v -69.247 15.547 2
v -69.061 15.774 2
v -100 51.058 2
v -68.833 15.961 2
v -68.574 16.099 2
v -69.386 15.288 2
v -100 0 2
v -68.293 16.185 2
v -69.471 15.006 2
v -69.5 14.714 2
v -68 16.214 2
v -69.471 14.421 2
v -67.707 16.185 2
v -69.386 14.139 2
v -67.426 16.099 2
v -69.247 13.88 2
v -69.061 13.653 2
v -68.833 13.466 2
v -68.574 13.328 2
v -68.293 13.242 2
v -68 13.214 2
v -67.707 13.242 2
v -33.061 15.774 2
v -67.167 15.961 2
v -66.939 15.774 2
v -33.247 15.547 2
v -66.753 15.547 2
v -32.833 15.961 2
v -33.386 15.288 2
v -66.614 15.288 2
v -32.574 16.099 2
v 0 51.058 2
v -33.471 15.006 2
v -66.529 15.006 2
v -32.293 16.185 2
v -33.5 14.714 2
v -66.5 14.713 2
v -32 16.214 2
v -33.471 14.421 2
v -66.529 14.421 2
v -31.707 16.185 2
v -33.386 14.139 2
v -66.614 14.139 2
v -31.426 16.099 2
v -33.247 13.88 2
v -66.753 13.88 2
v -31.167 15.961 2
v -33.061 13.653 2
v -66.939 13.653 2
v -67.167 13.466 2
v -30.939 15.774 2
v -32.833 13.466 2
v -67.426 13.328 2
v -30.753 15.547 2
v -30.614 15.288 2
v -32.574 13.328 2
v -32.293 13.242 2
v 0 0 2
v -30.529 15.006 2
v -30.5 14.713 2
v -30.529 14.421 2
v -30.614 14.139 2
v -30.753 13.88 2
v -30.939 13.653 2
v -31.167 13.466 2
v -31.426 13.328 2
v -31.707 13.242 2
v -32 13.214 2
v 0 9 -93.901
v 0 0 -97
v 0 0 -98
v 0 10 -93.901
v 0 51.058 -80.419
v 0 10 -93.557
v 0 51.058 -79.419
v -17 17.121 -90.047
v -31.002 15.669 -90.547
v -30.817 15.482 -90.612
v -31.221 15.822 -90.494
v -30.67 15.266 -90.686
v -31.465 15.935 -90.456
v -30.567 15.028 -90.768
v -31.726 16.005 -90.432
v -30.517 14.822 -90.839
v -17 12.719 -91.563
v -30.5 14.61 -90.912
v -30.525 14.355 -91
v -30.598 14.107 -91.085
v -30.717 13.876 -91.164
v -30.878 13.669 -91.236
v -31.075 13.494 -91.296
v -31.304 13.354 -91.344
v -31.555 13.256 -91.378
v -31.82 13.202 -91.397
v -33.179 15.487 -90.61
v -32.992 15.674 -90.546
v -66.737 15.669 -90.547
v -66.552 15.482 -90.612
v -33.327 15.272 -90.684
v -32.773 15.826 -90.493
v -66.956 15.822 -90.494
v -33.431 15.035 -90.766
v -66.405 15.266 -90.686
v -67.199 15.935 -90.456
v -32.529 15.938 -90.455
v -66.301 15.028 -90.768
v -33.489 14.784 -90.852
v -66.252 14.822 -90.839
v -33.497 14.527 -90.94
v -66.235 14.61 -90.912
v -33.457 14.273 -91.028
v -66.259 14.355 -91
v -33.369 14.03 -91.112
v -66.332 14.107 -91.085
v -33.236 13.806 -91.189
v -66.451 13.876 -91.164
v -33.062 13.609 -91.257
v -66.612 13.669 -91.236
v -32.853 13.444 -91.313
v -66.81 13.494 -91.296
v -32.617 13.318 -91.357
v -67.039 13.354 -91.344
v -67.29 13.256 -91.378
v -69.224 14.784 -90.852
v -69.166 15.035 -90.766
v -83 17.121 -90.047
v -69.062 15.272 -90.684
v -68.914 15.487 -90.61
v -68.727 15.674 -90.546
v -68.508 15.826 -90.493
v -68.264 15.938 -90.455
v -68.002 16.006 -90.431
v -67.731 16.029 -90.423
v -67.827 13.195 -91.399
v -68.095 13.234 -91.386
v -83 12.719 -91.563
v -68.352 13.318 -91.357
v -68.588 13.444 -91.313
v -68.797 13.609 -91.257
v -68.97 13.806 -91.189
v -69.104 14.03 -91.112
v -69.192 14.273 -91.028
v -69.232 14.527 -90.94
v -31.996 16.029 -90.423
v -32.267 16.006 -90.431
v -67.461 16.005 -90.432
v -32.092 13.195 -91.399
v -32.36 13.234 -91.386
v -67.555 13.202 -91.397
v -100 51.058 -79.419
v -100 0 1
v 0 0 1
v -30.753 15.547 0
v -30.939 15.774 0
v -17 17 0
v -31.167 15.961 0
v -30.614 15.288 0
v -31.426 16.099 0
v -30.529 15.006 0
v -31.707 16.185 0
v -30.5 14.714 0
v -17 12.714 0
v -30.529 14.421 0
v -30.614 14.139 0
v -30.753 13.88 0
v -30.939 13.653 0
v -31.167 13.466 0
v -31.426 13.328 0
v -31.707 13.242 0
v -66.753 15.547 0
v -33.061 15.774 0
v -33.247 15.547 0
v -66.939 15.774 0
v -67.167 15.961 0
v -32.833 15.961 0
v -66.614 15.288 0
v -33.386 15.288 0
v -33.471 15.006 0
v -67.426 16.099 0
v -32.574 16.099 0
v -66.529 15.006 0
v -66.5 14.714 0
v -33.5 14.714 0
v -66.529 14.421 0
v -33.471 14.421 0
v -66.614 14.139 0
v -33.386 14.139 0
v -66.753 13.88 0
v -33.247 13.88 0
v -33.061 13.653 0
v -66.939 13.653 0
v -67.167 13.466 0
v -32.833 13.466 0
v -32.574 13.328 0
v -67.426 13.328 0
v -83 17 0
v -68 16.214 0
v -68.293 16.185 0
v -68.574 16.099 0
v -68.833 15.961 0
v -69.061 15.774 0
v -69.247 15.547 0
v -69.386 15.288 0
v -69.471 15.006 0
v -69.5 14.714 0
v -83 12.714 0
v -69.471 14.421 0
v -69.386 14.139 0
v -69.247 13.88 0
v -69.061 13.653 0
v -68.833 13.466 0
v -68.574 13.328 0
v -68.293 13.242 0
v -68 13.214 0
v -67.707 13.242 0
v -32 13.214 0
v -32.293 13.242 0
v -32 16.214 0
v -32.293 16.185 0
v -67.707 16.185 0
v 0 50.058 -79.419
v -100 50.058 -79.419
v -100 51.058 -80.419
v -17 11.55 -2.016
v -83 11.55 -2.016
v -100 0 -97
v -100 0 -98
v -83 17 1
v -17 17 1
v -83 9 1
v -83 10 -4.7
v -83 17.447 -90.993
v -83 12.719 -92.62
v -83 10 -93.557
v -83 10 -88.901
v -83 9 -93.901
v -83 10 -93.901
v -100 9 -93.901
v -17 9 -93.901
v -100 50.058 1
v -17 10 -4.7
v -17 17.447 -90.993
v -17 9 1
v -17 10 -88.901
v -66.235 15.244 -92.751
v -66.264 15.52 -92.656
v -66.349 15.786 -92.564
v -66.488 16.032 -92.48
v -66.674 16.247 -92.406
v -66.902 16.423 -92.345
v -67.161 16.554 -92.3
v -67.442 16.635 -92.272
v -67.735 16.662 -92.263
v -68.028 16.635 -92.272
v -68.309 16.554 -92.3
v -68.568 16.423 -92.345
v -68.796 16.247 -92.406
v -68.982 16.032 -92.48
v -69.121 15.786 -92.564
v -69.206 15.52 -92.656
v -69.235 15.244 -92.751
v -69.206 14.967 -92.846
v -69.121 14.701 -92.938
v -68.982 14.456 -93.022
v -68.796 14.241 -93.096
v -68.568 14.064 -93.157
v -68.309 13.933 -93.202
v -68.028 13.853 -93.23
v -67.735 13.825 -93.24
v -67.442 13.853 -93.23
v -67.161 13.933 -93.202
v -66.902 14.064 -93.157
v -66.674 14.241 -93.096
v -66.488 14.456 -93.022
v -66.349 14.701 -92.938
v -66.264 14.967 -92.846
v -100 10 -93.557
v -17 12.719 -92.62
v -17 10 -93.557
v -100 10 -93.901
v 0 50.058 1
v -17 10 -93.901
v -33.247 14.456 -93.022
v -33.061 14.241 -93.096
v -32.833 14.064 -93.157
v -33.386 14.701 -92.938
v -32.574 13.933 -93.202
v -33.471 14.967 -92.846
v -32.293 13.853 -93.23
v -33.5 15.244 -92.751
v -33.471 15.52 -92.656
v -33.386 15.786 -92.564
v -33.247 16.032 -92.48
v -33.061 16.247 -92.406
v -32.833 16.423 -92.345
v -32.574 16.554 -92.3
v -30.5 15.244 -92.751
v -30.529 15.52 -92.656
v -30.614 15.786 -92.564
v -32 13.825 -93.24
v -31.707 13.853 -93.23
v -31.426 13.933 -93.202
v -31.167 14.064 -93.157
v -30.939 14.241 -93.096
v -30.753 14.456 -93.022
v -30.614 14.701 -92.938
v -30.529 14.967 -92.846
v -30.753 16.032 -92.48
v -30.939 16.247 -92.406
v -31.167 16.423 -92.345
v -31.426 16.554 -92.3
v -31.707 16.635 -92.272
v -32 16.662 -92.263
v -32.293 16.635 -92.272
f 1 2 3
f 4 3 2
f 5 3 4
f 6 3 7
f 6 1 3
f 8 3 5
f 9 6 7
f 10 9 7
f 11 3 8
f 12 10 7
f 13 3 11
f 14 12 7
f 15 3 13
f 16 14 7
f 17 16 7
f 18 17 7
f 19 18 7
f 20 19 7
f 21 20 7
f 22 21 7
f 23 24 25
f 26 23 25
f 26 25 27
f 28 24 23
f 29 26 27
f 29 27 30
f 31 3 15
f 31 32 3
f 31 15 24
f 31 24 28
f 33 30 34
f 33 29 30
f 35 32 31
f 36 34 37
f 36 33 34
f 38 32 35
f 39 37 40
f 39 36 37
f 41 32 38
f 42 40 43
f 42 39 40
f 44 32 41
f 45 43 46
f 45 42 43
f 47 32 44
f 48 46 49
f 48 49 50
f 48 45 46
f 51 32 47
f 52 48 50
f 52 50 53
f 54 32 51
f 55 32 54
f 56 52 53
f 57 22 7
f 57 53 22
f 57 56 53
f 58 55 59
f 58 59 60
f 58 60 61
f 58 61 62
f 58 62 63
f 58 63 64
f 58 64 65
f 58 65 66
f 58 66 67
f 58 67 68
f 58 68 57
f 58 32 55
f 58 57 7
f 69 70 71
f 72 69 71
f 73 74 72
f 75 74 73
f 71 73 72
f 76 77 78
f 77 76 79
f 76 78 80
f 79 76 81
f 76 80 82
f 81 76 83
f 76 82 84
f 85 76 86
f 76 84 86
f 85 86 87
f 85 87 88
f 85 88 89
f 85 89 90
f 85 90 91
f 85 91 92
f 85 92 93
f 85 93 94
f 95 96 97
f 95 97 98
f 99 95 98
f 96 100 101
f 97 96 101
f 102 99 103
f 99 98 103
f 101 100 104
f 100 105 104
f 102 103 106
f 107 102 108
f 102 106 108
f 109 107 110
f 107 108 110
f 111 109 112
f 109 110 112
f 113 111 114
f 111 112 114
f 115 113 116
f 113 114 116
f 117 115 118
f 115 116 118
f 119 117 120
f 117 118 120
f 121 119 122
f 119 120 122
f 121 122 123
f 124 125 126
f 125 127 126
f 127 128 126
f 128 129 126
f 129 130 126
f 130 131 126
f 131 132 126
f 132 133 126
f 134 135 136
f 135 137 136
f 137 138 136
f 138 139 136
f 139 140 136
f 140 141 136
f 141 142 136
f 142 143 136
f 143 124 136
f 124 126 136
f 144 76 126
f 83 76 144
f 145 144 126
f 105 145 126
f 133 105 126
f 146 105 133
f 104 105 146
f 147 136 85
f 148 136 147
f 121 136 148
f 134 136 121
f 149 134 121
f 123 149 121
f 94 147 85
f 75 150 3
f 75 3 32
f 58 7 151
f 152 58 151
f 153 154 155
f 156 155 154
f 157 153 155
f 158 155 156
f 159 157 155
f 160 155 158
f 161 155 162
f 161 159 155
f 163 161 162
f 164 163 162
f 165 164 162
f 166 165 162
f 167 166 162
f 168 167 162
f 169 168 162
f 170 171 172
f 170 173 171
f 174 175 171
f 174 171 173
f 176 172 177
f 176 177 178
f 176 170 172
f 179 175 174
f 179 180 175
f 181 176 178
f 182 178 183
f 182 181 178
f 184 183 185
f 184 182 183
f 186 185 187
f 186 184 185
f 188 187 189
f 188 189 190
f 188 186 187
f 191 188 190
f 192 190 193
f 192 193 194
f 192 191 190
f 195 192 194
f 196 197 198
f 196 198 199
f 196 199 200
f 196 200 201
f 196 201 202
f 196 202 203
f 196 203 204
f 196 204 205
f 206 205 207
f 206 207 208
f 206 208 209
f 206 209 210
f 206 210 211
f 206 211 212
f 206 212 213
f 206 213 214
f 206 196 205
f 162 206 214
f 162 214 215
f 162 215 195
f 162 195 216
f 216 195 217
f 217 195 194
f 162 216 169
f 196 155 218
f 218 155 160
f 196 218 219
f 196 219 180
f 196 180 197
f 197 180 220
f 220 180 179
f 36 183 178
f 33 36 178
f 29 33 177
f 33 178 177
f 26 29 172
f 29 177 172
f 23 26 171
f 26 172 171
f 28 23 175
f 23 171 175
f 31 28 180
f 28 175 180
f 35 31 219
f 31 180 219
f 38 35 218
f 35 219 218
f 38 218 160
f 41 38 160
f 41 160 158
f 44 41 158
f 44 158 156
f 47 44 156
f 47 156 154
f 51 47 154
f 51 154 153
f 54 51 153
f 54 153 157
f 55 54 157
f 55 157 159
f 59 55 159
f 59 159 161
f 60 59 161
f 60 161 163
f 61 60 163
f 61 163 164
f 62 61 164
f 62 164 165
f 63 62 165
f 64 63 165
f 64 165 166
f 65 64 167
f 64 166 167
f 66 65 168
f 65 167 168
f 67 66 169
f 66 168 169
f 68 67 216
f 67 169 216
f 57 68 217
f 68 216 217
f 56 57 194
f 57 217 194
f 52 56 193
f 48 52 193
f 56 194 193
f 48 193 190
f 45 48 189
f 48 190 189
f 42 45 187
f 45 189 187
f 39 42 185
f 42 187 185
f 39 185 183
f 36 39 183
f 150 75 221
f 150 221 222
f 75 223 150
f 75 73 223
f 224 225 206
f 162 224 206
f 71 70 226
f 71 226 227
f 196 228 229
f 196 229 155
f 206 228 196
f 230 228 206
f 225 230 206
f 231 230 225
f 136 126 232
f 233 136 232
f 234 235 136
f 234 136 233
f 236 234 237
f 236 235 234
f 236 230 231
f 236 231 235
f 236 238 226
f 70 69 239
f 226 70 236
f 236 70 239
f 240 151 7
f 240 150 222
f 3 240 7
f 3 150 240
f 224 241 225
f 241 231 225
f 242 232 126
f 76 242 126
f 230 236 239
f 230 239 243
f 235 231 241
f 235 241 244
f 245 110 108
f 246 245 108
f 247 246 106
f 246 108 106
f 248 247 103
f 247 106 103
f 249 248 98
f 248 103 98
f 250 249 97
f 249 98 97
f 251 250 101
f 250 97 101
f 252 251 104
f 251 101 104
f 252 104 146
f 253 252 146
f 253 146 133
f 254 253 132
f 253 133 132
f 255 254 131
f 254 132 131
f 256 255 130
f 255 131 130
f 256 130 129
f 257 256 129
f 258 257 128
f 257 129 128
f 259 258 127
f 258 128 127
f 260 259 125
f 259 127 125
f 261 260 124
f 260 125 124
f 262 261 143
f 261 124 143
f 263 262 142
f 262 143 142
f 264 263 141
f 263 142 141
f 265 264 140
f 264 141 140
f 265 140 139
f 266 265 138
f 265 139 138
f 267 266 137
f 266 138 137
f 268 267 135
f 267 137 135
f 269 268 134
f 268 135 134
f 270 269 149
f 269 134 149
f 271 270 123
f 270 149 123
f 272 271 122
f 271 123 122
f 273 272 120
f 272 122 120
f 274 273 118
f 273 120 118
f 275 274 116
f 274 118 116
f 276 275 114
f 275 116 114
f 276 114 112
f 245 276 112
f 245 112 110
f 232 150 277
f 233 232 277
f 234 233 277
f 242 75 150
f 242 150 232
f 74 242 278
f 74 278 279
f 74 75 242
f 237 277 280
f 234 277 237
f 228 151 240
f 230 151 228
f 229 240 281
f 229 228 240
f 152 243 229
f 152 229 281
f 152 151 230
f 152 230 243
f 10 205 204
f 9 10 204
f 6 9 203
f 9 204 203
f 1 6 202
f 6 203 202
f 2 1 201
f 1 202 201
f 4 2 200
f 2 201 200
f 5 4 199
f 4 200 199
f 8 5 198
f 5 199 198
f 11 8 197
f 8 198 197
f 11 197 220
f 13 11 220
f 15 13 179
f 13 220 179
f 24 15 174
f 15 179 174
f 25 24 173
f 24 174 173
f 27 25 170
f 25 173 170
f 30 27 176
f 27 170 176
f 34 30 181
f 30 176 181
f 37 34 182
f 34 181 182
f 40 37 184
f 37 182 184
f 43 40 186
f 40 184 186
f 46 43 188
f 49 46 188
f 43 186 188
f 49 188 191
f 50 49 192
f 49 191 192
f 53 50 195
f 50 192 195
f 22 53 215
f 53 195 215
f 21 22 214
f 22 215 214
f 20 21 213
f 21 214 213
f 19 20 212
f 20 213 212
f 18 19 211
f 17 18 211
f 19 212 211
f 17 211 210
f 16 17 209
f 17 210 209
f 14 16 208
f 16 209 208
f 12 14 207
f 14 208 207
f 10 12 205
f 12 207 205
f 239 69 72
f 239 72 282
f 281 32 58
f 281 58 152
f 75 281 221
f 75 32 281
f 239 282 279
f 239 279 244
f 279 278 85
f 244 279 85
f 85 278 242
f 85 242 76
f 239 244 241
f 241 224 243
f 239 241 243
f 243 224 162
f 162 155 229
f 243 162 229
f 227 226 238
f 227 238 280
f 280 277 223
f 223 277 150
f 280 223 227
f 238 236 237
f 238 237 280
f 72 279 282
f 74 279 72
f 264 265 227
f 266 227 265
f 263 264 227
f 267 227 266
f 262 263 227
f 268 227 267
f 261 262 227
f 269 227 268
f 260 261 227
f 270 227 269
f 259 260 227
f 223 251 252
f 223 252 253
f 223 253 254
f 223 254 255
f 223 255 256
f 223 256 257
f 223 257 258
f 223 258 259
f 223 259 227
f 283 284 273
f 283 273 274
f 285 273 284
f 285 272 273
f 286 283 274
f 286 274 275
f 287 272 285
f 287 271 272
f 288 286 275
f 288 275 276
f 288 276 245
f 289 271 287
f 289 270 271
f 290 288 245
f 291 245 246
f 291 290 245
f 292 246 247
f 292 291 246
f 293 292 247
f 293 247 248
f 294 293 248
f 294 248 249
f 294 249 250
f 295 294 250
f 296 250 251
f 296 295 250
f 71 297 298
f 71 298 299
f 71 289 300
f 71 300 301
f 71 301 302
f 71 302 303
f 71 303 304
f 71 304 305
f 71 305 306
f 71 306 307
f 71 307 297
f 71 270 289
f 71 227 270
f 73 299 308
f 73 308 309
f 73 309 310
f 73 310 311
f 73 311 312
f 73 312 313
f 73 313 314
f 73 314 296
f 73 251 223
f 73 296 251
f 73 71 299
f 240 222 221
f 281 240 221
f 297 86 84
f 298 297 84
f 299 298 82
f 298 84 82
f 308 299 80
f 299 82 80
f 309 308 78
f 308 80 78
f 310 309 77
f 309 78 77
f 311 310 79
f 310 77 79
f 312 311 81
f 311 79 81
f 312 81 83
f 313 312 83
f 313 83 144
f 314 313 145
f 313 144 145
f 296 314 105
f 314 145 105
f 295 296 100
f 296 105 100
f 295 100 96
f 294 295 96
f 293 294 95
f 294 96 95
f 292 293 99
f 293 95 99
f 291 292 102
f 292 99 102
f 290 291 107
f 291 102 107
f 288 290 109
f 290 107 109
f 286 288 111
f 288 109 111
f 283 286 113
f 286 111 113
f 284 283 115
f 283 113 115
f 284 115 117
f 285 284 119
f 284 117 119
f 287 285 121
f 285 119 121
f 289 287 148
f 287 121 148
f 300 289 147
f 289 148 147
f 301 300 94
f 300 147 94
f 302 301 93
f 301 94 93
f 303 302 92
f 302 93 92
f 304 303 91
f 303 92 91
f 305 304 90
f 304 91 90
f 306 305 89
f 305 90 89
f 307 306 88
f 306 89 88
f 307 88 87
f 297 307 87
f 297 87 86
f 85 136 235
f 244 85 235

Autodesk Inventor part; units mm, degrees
ref_plane "YZ Plane" through (0, 0, 0) normal (1, 0, 0) x (0, 1, 0)
ref_plane "XZ Plane" through (0, 0, 0) normal (0, 1, 0) x (-1, 0, 0)
ref_plane "XY Plane" through (0, 0, 0) normal (0, 0, 1) x (1, 0, 0)
sketch "Szkic1" plane through (0, 0, 0) normal (1, 0, 0) x (0, 1, 0)
  line L0 (0, 0) -> (0, -88)
  line L1 (51.058, -70.4193) -> (51.058, -71.4193)
  line L2 (0, -88) -> (0, -97)
  line L3 (0, -97) -> (0, -98)
  line L4 (0, -98) -> (51.058, -80.4193)
  line L5 (51.058, -80.4193) -> (51.058, -79.4193)
  line L6 (51.058, -79.4193) -> (0, -97)
  line L7 (0, 0) -> (0, 1)
  line L8 (0, 1) -> (51.058, 1)
  line L9 (51.058, 1) -> (51.058, 2)
  line L10 (51.058, 2) -> (0, 2)
  line L11 (0, 2) -> (0, 1)
  dimension "d0" = 88
  dimension "d1" = 54
  dimension "d5" = 9
  dimension "d6" = 1
  dimension "d7" = 54
  dimension "d8" = 71
  dimension "d9" = 1
  dimension "d10" = 1
  dimension "d11" = 1
extrude "Wyciągnięcie proste1" add sketch "Szkic1" against normal blind 100
sketch "Szkic2" plane through (-100, 0, 0) normal (-1, 0, 0) x (0, 0, 1)
  line L0 (0, 10) -> (1, 10)
  line L1 (1, 51.058) -> (1, 0) projected
  line L2 (0, 10) -> (-93.5567, 10)
  line L3 (-79.4193, 51.058) -> (-97, 0) projected
  line L4 (0, 9) -> (1, 9)
  line L5 (0, 9) -> (-93.9011, 9)
  line L6 (-93.5567, 10) -> (-93.9011, 9)
  line L7 (1, 10) -> (1, 9)
  point P0 (0, 0)
  dimension "d14" = 10
  dimension "d15" = 1
extrude "Wyciągnięcie proste2" add sketch "Szkic2" against normal blind 100
sketch "Szkic3" plane through (-100, 51.058, -79.4193) normal (0, -0.3256, 0.9455) x (1, 0, 0)
  point P0 (100, -22.4199)
sketch "Szkic4" plane through (-100, 51.058, -80.4193) normal (0, 1, 0) x (1, 0, 0)
  line L0 (100, -81.4193) -> (100, 13.4817) projected
  line L1 (100, 0) -> (100, -1) projected
  line L2 (100, -81.4193) -> (100, -1)
  line L3 (0, -1) -> (0, 0) projected
  line L4 (100, -1) -> (0, -1)
  line L5 (0, 13.4817) -> (0, -81.4193) projected
  line L6 (0, -1) -> (0, -81.4193)
  line L7 (100, -81.4193) -> (0, -81.4193) projected
  line L8 (0, -81.4193) -> (100, -81.4193)
  point P0 (100, -80.4193)
extrude "Wyciągnięcie proste3" add sketch "Szkic4" against normal blind 1
sketch "Szkic5" plane through (-100, 9, -93.9011) normal (0, -1, 0) x (1, 0, 0)
  point P0 (100, 93.9011)
sketch "Szkic6" plane through (-100, 51.058, -79.4193) normal (-1, 0, 0) x (0, 0, -1)
  point P0 (-79.4193, 51.058)
sketch "Szkic7" plane through (-100, 9, -93.9011) normal (0, -1, 0) x (1, 0, 0)
  line L0 (100, 14.4817) -> (100, 94.9011) projected
  line L1 (100, 94.9011) -> (90, 94.9011)
  line L2 (0, 94.9011) -> (100, 94.9011) projected
  line L3 (90, 94.9011) -> (90, 0)
  line L4 (100, 0) -> (0, 0) projected
  line L5 (90, 0) -> (100, 0)
  line L6 (100, 0) -> (100, 94.9011)
  line L7 (90, 94.9011) -> (100, 94.9011)
  line L8 (0, 94.9011) -> (10, 94.9011)
  line L9 (10, 94.9011) -> (10, 0)
  line L10 (0, 0) -> (0, 94.9011) projected
  line L11 (10, 0) -> (0, 0)
  line L12 (0, 94.9011) -> (0, 14.4817) projected
  line L13 (0, 0) -> (0, 94.9011)
  line L14 (0, 94.9011) -> (10, 94.9011)
  point P0 (100, 93.9011)
  dimension "d20" = 10
  dimension "d21" = 10
extrude "Wyciągnięcie proste4" cut sketch "Szkic7" against normal blind 1 contours L6 L4 L3 L1 L0 | L9 L4 L10 L2
sketch "Szkic8" plane through (-90, 9, 1) normal (0, -1, 0) x (1, 0, 0)
  line L0 (80, -94.9011) -> (80, 0) projected
  line L1 (80, 0) -> (73, 0)
  line L2 (80, 0) -> (0, 0) projected
  line L3 (73, 0) -> (73, -94.9011)
  line L4 (80, -94.9011) -> (0, -94.9011) projected
  line L5 (80, -94.9011) -> (80, 0)
  line L6 (90, 1) -> (-10, 1) projected
  line L7 (80, 0) -> (73, 0)
  line L8 (0, 0) -> (7, 0)
  line L9 (7, 0) -> (7, -94.9011)
  line L10 (0, -94.9011) -> (7, -94.9011)
  line L11 (0, 0) -> (0, -94.9011) projected
  line L12 (0, -94.9011) -> (0, 0)
  line L13 (0, -94.5567) -> (0, 0) projected
  point P0 (90, -1)
  dimension "d24" = 7
  dimension "d25" = 7
extrude "Wyciągnięcie proste5" cut sketch "Szkic8" against normal blind 1 contours L4 L3 L1 L0 | L4 L11 L2 L9
sketch "Szkic9" plane through (-83, 9, -93.9011) normal (-1, 0, 0) x (0, 0, 1)
  line L0 (0, 0) -> (94.9011, 0) projected
  line L1 (0, 0) -> (5, 0)
  line L2 (5, 0) -> (1.9955, 3.0045)
  line L3 (5, 0) -> (9.2489, 0) construction
  line L4 (1.9955, 3.0045) -> (1.2807, 3.7193)
  line L5 (1.2807, 3.7193) -> (2.9085, 8.4469)
  line L6 (14.4817, 42.058) -> (0.3443, 1) projected
  line L7 (2.9085, 8.4469) -> (3.854, 8.1214)
  line L8 (3.854, 8.1214) -> (2.3383, 3.7193)
  line L9 (2.3383, 3.7193) -> (5, 1)
  line L10 (94.9011, 1) -> (0.3443, 1) projected
  line L11 (5, 1) -> (5, 0)
  point P0 (93.9011, -9)
  dimension "d28" = 5
  dimension "d29" = 135
  dimension "d31" = 5
  dimension "d32" = 1
extrude "Wyciągnięcie proste6" add sketch "Szkic9" against normal blind 66 contours L10 L6 L4 L2 | L2 L4 L5 L7 L8 L9 L10
sketch "Szkic10" plane through (-83, 12.7193, -91.5628) normal (0, -0.3256, 0.9455) x (1, 0, 0)
  line L0 (0.2651, 0) -> (15.2651, 0)
  line L1 (0, 0) -> (66, 0) projected
  line L2 (15.2651, 0) -> (15.2651, 2)
  line L3 (0, 4.6557) -> (66, 4.6557) projected
  circle A0 centre (15.2651, 2) radius 1.5
  line L4 (66, 0) -> (51, 0)
  line L5 (51, 0) -> (51, 2)
  circle A1 centre (51, 2) radius 1.5
  point P0 (83, 17.7836)
  dimension "d35" = 15
  dimension "d36" = 2
  dimension "d37" = 3
  dimension "d38" = 15
  dimension "d39" = 2
  dimension "d40" = 3
extrude "Wyciągnięcie proste7" cut sketch "Szkic10" against normal blind 15
sketch "Szkic11" plane through (-83, 9, -93.9011) normal (-1, 0, 0) x (0, 0, 1)
  line L0 (94.9011, 1) -> (5, 1) projected
  line L1 (94.9011, 1) -> (90.2011, 1)
  line L2 (90.2011, 1) -> (93.0515, 3.8505)
  line L3 (93.0515, 3.8505) -> (94.9011, 5.7)
  line L4 (94.9011, 41.058) -> (94.9011, -9) projected
  line L5 (90.2011, 1) -> (89.2011, 1)
  line L6 (94.9011, 0) -> (94.9011, 1) projected
  line L7 (94.9011, 1) -> (94.9011, 9)
  line L8 (94.9011, 9) -> (93.9011, 9)
  line L9 (93.9011, 9) -> (93.9011, 5.7)
  line L10 (93.9011, 5.7) -> (89.2011, 1)
  line L11 (94.9011, 9) -> (94.9011, 5.7)
  point P0 (93.9011, -9)
  dimension "d43" = 4.7
  dimension "d44" = 45
  dimension "d45" = 1
  dimension "d46" = 8
  dimension "d47" = 1
extrude "Wyciągnięcie proste8" add sketch "Szkic11" against normal blind 66
sketch "Szkic12" plane through (-83, 14.7, 0) normal (0, 0, -1) x (-1, 0, 0)
  point P0 (-83, -14.7)
sketch "Szkic13" plane through (-83, 9, -93.9011) normal (-1, 0, 0) x (0, 0, 1)
  line L0 (93.9011, 5.7) -> (89.2011, 1) projected
  line L1 (89.2011, 1) -> (91.885, 2.5496)
  line L2 (89.2011, 1) -> (92.3002, 1) construction
  line L3 (91.885, 2.5496) -> (93.9011, 3.7135)
  line L4 (93.9011, 5.7) -> (93.9011, 3.7135)
  line L5 (5, 1) -> (89.2011, 1) projected
  line L6 (93.9011, 5.7) -> (89.2011, 1)
  point P0 (93.9011, -9)
  dimension "d50" = 30
extrude "Wyciągnięcie proste9" cut sketch "Szkic13" against normal blind 66
sketch "Szkic14" plane through (-17, 18, 0) normal (0, 0, -1) x (-1, 0, 0)
  line L0 (66, -5.2865) -> (0, -5.2865) projected
  line L1 (66, -5.2865) -> (51, -5.2865)
  line L2 (51, -5.2865) -> (51, -3.2865)
  circle A0 centre (51, -3.2865) radius 1.5
  line L3 (0, -5.2865) -> (0, 0) projected
  line L4 (0, -5.2865) -> (15, -5.2865)
  line L5 (15, -5.2865) -> (15, -3.2865)
  circle A1 centre (15, -3.2865) radius 1.5
  point P0 (-17, -18)
  dimension "d53" = 15
  dimension "d54" = 2
  dimension "d55" = 3
  dimension "d56" = 15
  dimension "d57" = 2
  dimension "d58" = 3
extrude "Wyciągnięcie proste10" cut sketch "Szkic14" against normal blind 15
sketch "Szkic15" plane through (-83, 9, -93.9011) normal (-1, 0, 0) x (0, 0, 1)
  point P0 (93.9011, -9)
sketch "Szkic16" plane through (-17, 18, 0) normal (0, 0, -1) x (-1, 0, 0)
  point P0 (-17, -18)
sketch "Szkic17" plane through (-83, 9, -93.9011) normal (-1, 0, 0) x (0, 0, 1)
  line L0 (94.9011, 9) -> (93.9011, 9) projected
  line L1 (94.9011, 9) -> (94.9011, 8)
  line L2 (94.9011, 41.058) -> (94.9011, -9) projected
  line L3 (94.9011, 8) -> (93.9011, 8)
  line L4 (93.9011, 3.7135) -> (93.9011, 9) projected
  line L5 (93.9011, 9) -> (94.9011, 9)
  point P0 (93.9011, -9)
  dimension "d61" = 1
extrude "Wyciągnięcie proste11" cut sketch "Szkic17" against normal blind 66
properties part number "zderzaki"
